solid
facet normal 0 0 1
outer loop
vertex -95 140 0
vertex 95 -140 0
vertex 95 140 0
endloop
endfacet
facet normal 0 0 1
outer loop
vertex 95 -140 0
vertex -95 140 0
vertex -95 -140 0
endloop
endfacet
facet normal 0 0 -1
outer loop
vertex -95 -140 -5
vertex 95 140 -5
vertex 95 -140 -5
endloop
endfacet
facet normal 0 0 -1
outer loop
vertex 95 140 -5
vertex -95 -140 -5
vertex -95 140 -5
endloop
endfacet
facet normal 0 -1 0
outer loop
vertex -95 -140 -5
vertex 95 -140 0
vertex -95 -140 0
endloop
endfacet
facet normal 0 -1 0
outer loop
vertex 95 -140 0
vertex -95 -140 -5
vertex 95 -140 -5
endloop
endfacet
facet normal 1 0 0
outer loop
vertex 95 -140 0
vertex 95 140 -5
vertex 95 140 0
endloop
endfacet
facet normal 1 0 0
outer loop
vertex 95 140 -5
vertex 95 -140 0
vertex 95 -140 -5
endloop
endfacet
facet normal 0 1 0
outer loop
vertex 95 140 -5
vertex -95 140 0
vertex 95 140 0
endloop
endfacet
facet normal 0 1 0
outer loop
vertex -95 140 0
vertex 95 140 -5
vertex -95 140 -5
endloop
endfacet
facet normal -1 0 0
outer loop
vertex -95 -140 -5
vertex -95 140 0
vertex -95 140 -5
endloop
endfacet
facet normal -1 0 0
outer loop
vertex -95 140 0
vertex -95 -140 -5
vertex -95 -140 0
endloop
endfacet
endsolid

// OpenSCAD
w = 190;
d = 280;
th = 5;

translate([-w/2,-d/2,-th]) cube([w,d,th]);
